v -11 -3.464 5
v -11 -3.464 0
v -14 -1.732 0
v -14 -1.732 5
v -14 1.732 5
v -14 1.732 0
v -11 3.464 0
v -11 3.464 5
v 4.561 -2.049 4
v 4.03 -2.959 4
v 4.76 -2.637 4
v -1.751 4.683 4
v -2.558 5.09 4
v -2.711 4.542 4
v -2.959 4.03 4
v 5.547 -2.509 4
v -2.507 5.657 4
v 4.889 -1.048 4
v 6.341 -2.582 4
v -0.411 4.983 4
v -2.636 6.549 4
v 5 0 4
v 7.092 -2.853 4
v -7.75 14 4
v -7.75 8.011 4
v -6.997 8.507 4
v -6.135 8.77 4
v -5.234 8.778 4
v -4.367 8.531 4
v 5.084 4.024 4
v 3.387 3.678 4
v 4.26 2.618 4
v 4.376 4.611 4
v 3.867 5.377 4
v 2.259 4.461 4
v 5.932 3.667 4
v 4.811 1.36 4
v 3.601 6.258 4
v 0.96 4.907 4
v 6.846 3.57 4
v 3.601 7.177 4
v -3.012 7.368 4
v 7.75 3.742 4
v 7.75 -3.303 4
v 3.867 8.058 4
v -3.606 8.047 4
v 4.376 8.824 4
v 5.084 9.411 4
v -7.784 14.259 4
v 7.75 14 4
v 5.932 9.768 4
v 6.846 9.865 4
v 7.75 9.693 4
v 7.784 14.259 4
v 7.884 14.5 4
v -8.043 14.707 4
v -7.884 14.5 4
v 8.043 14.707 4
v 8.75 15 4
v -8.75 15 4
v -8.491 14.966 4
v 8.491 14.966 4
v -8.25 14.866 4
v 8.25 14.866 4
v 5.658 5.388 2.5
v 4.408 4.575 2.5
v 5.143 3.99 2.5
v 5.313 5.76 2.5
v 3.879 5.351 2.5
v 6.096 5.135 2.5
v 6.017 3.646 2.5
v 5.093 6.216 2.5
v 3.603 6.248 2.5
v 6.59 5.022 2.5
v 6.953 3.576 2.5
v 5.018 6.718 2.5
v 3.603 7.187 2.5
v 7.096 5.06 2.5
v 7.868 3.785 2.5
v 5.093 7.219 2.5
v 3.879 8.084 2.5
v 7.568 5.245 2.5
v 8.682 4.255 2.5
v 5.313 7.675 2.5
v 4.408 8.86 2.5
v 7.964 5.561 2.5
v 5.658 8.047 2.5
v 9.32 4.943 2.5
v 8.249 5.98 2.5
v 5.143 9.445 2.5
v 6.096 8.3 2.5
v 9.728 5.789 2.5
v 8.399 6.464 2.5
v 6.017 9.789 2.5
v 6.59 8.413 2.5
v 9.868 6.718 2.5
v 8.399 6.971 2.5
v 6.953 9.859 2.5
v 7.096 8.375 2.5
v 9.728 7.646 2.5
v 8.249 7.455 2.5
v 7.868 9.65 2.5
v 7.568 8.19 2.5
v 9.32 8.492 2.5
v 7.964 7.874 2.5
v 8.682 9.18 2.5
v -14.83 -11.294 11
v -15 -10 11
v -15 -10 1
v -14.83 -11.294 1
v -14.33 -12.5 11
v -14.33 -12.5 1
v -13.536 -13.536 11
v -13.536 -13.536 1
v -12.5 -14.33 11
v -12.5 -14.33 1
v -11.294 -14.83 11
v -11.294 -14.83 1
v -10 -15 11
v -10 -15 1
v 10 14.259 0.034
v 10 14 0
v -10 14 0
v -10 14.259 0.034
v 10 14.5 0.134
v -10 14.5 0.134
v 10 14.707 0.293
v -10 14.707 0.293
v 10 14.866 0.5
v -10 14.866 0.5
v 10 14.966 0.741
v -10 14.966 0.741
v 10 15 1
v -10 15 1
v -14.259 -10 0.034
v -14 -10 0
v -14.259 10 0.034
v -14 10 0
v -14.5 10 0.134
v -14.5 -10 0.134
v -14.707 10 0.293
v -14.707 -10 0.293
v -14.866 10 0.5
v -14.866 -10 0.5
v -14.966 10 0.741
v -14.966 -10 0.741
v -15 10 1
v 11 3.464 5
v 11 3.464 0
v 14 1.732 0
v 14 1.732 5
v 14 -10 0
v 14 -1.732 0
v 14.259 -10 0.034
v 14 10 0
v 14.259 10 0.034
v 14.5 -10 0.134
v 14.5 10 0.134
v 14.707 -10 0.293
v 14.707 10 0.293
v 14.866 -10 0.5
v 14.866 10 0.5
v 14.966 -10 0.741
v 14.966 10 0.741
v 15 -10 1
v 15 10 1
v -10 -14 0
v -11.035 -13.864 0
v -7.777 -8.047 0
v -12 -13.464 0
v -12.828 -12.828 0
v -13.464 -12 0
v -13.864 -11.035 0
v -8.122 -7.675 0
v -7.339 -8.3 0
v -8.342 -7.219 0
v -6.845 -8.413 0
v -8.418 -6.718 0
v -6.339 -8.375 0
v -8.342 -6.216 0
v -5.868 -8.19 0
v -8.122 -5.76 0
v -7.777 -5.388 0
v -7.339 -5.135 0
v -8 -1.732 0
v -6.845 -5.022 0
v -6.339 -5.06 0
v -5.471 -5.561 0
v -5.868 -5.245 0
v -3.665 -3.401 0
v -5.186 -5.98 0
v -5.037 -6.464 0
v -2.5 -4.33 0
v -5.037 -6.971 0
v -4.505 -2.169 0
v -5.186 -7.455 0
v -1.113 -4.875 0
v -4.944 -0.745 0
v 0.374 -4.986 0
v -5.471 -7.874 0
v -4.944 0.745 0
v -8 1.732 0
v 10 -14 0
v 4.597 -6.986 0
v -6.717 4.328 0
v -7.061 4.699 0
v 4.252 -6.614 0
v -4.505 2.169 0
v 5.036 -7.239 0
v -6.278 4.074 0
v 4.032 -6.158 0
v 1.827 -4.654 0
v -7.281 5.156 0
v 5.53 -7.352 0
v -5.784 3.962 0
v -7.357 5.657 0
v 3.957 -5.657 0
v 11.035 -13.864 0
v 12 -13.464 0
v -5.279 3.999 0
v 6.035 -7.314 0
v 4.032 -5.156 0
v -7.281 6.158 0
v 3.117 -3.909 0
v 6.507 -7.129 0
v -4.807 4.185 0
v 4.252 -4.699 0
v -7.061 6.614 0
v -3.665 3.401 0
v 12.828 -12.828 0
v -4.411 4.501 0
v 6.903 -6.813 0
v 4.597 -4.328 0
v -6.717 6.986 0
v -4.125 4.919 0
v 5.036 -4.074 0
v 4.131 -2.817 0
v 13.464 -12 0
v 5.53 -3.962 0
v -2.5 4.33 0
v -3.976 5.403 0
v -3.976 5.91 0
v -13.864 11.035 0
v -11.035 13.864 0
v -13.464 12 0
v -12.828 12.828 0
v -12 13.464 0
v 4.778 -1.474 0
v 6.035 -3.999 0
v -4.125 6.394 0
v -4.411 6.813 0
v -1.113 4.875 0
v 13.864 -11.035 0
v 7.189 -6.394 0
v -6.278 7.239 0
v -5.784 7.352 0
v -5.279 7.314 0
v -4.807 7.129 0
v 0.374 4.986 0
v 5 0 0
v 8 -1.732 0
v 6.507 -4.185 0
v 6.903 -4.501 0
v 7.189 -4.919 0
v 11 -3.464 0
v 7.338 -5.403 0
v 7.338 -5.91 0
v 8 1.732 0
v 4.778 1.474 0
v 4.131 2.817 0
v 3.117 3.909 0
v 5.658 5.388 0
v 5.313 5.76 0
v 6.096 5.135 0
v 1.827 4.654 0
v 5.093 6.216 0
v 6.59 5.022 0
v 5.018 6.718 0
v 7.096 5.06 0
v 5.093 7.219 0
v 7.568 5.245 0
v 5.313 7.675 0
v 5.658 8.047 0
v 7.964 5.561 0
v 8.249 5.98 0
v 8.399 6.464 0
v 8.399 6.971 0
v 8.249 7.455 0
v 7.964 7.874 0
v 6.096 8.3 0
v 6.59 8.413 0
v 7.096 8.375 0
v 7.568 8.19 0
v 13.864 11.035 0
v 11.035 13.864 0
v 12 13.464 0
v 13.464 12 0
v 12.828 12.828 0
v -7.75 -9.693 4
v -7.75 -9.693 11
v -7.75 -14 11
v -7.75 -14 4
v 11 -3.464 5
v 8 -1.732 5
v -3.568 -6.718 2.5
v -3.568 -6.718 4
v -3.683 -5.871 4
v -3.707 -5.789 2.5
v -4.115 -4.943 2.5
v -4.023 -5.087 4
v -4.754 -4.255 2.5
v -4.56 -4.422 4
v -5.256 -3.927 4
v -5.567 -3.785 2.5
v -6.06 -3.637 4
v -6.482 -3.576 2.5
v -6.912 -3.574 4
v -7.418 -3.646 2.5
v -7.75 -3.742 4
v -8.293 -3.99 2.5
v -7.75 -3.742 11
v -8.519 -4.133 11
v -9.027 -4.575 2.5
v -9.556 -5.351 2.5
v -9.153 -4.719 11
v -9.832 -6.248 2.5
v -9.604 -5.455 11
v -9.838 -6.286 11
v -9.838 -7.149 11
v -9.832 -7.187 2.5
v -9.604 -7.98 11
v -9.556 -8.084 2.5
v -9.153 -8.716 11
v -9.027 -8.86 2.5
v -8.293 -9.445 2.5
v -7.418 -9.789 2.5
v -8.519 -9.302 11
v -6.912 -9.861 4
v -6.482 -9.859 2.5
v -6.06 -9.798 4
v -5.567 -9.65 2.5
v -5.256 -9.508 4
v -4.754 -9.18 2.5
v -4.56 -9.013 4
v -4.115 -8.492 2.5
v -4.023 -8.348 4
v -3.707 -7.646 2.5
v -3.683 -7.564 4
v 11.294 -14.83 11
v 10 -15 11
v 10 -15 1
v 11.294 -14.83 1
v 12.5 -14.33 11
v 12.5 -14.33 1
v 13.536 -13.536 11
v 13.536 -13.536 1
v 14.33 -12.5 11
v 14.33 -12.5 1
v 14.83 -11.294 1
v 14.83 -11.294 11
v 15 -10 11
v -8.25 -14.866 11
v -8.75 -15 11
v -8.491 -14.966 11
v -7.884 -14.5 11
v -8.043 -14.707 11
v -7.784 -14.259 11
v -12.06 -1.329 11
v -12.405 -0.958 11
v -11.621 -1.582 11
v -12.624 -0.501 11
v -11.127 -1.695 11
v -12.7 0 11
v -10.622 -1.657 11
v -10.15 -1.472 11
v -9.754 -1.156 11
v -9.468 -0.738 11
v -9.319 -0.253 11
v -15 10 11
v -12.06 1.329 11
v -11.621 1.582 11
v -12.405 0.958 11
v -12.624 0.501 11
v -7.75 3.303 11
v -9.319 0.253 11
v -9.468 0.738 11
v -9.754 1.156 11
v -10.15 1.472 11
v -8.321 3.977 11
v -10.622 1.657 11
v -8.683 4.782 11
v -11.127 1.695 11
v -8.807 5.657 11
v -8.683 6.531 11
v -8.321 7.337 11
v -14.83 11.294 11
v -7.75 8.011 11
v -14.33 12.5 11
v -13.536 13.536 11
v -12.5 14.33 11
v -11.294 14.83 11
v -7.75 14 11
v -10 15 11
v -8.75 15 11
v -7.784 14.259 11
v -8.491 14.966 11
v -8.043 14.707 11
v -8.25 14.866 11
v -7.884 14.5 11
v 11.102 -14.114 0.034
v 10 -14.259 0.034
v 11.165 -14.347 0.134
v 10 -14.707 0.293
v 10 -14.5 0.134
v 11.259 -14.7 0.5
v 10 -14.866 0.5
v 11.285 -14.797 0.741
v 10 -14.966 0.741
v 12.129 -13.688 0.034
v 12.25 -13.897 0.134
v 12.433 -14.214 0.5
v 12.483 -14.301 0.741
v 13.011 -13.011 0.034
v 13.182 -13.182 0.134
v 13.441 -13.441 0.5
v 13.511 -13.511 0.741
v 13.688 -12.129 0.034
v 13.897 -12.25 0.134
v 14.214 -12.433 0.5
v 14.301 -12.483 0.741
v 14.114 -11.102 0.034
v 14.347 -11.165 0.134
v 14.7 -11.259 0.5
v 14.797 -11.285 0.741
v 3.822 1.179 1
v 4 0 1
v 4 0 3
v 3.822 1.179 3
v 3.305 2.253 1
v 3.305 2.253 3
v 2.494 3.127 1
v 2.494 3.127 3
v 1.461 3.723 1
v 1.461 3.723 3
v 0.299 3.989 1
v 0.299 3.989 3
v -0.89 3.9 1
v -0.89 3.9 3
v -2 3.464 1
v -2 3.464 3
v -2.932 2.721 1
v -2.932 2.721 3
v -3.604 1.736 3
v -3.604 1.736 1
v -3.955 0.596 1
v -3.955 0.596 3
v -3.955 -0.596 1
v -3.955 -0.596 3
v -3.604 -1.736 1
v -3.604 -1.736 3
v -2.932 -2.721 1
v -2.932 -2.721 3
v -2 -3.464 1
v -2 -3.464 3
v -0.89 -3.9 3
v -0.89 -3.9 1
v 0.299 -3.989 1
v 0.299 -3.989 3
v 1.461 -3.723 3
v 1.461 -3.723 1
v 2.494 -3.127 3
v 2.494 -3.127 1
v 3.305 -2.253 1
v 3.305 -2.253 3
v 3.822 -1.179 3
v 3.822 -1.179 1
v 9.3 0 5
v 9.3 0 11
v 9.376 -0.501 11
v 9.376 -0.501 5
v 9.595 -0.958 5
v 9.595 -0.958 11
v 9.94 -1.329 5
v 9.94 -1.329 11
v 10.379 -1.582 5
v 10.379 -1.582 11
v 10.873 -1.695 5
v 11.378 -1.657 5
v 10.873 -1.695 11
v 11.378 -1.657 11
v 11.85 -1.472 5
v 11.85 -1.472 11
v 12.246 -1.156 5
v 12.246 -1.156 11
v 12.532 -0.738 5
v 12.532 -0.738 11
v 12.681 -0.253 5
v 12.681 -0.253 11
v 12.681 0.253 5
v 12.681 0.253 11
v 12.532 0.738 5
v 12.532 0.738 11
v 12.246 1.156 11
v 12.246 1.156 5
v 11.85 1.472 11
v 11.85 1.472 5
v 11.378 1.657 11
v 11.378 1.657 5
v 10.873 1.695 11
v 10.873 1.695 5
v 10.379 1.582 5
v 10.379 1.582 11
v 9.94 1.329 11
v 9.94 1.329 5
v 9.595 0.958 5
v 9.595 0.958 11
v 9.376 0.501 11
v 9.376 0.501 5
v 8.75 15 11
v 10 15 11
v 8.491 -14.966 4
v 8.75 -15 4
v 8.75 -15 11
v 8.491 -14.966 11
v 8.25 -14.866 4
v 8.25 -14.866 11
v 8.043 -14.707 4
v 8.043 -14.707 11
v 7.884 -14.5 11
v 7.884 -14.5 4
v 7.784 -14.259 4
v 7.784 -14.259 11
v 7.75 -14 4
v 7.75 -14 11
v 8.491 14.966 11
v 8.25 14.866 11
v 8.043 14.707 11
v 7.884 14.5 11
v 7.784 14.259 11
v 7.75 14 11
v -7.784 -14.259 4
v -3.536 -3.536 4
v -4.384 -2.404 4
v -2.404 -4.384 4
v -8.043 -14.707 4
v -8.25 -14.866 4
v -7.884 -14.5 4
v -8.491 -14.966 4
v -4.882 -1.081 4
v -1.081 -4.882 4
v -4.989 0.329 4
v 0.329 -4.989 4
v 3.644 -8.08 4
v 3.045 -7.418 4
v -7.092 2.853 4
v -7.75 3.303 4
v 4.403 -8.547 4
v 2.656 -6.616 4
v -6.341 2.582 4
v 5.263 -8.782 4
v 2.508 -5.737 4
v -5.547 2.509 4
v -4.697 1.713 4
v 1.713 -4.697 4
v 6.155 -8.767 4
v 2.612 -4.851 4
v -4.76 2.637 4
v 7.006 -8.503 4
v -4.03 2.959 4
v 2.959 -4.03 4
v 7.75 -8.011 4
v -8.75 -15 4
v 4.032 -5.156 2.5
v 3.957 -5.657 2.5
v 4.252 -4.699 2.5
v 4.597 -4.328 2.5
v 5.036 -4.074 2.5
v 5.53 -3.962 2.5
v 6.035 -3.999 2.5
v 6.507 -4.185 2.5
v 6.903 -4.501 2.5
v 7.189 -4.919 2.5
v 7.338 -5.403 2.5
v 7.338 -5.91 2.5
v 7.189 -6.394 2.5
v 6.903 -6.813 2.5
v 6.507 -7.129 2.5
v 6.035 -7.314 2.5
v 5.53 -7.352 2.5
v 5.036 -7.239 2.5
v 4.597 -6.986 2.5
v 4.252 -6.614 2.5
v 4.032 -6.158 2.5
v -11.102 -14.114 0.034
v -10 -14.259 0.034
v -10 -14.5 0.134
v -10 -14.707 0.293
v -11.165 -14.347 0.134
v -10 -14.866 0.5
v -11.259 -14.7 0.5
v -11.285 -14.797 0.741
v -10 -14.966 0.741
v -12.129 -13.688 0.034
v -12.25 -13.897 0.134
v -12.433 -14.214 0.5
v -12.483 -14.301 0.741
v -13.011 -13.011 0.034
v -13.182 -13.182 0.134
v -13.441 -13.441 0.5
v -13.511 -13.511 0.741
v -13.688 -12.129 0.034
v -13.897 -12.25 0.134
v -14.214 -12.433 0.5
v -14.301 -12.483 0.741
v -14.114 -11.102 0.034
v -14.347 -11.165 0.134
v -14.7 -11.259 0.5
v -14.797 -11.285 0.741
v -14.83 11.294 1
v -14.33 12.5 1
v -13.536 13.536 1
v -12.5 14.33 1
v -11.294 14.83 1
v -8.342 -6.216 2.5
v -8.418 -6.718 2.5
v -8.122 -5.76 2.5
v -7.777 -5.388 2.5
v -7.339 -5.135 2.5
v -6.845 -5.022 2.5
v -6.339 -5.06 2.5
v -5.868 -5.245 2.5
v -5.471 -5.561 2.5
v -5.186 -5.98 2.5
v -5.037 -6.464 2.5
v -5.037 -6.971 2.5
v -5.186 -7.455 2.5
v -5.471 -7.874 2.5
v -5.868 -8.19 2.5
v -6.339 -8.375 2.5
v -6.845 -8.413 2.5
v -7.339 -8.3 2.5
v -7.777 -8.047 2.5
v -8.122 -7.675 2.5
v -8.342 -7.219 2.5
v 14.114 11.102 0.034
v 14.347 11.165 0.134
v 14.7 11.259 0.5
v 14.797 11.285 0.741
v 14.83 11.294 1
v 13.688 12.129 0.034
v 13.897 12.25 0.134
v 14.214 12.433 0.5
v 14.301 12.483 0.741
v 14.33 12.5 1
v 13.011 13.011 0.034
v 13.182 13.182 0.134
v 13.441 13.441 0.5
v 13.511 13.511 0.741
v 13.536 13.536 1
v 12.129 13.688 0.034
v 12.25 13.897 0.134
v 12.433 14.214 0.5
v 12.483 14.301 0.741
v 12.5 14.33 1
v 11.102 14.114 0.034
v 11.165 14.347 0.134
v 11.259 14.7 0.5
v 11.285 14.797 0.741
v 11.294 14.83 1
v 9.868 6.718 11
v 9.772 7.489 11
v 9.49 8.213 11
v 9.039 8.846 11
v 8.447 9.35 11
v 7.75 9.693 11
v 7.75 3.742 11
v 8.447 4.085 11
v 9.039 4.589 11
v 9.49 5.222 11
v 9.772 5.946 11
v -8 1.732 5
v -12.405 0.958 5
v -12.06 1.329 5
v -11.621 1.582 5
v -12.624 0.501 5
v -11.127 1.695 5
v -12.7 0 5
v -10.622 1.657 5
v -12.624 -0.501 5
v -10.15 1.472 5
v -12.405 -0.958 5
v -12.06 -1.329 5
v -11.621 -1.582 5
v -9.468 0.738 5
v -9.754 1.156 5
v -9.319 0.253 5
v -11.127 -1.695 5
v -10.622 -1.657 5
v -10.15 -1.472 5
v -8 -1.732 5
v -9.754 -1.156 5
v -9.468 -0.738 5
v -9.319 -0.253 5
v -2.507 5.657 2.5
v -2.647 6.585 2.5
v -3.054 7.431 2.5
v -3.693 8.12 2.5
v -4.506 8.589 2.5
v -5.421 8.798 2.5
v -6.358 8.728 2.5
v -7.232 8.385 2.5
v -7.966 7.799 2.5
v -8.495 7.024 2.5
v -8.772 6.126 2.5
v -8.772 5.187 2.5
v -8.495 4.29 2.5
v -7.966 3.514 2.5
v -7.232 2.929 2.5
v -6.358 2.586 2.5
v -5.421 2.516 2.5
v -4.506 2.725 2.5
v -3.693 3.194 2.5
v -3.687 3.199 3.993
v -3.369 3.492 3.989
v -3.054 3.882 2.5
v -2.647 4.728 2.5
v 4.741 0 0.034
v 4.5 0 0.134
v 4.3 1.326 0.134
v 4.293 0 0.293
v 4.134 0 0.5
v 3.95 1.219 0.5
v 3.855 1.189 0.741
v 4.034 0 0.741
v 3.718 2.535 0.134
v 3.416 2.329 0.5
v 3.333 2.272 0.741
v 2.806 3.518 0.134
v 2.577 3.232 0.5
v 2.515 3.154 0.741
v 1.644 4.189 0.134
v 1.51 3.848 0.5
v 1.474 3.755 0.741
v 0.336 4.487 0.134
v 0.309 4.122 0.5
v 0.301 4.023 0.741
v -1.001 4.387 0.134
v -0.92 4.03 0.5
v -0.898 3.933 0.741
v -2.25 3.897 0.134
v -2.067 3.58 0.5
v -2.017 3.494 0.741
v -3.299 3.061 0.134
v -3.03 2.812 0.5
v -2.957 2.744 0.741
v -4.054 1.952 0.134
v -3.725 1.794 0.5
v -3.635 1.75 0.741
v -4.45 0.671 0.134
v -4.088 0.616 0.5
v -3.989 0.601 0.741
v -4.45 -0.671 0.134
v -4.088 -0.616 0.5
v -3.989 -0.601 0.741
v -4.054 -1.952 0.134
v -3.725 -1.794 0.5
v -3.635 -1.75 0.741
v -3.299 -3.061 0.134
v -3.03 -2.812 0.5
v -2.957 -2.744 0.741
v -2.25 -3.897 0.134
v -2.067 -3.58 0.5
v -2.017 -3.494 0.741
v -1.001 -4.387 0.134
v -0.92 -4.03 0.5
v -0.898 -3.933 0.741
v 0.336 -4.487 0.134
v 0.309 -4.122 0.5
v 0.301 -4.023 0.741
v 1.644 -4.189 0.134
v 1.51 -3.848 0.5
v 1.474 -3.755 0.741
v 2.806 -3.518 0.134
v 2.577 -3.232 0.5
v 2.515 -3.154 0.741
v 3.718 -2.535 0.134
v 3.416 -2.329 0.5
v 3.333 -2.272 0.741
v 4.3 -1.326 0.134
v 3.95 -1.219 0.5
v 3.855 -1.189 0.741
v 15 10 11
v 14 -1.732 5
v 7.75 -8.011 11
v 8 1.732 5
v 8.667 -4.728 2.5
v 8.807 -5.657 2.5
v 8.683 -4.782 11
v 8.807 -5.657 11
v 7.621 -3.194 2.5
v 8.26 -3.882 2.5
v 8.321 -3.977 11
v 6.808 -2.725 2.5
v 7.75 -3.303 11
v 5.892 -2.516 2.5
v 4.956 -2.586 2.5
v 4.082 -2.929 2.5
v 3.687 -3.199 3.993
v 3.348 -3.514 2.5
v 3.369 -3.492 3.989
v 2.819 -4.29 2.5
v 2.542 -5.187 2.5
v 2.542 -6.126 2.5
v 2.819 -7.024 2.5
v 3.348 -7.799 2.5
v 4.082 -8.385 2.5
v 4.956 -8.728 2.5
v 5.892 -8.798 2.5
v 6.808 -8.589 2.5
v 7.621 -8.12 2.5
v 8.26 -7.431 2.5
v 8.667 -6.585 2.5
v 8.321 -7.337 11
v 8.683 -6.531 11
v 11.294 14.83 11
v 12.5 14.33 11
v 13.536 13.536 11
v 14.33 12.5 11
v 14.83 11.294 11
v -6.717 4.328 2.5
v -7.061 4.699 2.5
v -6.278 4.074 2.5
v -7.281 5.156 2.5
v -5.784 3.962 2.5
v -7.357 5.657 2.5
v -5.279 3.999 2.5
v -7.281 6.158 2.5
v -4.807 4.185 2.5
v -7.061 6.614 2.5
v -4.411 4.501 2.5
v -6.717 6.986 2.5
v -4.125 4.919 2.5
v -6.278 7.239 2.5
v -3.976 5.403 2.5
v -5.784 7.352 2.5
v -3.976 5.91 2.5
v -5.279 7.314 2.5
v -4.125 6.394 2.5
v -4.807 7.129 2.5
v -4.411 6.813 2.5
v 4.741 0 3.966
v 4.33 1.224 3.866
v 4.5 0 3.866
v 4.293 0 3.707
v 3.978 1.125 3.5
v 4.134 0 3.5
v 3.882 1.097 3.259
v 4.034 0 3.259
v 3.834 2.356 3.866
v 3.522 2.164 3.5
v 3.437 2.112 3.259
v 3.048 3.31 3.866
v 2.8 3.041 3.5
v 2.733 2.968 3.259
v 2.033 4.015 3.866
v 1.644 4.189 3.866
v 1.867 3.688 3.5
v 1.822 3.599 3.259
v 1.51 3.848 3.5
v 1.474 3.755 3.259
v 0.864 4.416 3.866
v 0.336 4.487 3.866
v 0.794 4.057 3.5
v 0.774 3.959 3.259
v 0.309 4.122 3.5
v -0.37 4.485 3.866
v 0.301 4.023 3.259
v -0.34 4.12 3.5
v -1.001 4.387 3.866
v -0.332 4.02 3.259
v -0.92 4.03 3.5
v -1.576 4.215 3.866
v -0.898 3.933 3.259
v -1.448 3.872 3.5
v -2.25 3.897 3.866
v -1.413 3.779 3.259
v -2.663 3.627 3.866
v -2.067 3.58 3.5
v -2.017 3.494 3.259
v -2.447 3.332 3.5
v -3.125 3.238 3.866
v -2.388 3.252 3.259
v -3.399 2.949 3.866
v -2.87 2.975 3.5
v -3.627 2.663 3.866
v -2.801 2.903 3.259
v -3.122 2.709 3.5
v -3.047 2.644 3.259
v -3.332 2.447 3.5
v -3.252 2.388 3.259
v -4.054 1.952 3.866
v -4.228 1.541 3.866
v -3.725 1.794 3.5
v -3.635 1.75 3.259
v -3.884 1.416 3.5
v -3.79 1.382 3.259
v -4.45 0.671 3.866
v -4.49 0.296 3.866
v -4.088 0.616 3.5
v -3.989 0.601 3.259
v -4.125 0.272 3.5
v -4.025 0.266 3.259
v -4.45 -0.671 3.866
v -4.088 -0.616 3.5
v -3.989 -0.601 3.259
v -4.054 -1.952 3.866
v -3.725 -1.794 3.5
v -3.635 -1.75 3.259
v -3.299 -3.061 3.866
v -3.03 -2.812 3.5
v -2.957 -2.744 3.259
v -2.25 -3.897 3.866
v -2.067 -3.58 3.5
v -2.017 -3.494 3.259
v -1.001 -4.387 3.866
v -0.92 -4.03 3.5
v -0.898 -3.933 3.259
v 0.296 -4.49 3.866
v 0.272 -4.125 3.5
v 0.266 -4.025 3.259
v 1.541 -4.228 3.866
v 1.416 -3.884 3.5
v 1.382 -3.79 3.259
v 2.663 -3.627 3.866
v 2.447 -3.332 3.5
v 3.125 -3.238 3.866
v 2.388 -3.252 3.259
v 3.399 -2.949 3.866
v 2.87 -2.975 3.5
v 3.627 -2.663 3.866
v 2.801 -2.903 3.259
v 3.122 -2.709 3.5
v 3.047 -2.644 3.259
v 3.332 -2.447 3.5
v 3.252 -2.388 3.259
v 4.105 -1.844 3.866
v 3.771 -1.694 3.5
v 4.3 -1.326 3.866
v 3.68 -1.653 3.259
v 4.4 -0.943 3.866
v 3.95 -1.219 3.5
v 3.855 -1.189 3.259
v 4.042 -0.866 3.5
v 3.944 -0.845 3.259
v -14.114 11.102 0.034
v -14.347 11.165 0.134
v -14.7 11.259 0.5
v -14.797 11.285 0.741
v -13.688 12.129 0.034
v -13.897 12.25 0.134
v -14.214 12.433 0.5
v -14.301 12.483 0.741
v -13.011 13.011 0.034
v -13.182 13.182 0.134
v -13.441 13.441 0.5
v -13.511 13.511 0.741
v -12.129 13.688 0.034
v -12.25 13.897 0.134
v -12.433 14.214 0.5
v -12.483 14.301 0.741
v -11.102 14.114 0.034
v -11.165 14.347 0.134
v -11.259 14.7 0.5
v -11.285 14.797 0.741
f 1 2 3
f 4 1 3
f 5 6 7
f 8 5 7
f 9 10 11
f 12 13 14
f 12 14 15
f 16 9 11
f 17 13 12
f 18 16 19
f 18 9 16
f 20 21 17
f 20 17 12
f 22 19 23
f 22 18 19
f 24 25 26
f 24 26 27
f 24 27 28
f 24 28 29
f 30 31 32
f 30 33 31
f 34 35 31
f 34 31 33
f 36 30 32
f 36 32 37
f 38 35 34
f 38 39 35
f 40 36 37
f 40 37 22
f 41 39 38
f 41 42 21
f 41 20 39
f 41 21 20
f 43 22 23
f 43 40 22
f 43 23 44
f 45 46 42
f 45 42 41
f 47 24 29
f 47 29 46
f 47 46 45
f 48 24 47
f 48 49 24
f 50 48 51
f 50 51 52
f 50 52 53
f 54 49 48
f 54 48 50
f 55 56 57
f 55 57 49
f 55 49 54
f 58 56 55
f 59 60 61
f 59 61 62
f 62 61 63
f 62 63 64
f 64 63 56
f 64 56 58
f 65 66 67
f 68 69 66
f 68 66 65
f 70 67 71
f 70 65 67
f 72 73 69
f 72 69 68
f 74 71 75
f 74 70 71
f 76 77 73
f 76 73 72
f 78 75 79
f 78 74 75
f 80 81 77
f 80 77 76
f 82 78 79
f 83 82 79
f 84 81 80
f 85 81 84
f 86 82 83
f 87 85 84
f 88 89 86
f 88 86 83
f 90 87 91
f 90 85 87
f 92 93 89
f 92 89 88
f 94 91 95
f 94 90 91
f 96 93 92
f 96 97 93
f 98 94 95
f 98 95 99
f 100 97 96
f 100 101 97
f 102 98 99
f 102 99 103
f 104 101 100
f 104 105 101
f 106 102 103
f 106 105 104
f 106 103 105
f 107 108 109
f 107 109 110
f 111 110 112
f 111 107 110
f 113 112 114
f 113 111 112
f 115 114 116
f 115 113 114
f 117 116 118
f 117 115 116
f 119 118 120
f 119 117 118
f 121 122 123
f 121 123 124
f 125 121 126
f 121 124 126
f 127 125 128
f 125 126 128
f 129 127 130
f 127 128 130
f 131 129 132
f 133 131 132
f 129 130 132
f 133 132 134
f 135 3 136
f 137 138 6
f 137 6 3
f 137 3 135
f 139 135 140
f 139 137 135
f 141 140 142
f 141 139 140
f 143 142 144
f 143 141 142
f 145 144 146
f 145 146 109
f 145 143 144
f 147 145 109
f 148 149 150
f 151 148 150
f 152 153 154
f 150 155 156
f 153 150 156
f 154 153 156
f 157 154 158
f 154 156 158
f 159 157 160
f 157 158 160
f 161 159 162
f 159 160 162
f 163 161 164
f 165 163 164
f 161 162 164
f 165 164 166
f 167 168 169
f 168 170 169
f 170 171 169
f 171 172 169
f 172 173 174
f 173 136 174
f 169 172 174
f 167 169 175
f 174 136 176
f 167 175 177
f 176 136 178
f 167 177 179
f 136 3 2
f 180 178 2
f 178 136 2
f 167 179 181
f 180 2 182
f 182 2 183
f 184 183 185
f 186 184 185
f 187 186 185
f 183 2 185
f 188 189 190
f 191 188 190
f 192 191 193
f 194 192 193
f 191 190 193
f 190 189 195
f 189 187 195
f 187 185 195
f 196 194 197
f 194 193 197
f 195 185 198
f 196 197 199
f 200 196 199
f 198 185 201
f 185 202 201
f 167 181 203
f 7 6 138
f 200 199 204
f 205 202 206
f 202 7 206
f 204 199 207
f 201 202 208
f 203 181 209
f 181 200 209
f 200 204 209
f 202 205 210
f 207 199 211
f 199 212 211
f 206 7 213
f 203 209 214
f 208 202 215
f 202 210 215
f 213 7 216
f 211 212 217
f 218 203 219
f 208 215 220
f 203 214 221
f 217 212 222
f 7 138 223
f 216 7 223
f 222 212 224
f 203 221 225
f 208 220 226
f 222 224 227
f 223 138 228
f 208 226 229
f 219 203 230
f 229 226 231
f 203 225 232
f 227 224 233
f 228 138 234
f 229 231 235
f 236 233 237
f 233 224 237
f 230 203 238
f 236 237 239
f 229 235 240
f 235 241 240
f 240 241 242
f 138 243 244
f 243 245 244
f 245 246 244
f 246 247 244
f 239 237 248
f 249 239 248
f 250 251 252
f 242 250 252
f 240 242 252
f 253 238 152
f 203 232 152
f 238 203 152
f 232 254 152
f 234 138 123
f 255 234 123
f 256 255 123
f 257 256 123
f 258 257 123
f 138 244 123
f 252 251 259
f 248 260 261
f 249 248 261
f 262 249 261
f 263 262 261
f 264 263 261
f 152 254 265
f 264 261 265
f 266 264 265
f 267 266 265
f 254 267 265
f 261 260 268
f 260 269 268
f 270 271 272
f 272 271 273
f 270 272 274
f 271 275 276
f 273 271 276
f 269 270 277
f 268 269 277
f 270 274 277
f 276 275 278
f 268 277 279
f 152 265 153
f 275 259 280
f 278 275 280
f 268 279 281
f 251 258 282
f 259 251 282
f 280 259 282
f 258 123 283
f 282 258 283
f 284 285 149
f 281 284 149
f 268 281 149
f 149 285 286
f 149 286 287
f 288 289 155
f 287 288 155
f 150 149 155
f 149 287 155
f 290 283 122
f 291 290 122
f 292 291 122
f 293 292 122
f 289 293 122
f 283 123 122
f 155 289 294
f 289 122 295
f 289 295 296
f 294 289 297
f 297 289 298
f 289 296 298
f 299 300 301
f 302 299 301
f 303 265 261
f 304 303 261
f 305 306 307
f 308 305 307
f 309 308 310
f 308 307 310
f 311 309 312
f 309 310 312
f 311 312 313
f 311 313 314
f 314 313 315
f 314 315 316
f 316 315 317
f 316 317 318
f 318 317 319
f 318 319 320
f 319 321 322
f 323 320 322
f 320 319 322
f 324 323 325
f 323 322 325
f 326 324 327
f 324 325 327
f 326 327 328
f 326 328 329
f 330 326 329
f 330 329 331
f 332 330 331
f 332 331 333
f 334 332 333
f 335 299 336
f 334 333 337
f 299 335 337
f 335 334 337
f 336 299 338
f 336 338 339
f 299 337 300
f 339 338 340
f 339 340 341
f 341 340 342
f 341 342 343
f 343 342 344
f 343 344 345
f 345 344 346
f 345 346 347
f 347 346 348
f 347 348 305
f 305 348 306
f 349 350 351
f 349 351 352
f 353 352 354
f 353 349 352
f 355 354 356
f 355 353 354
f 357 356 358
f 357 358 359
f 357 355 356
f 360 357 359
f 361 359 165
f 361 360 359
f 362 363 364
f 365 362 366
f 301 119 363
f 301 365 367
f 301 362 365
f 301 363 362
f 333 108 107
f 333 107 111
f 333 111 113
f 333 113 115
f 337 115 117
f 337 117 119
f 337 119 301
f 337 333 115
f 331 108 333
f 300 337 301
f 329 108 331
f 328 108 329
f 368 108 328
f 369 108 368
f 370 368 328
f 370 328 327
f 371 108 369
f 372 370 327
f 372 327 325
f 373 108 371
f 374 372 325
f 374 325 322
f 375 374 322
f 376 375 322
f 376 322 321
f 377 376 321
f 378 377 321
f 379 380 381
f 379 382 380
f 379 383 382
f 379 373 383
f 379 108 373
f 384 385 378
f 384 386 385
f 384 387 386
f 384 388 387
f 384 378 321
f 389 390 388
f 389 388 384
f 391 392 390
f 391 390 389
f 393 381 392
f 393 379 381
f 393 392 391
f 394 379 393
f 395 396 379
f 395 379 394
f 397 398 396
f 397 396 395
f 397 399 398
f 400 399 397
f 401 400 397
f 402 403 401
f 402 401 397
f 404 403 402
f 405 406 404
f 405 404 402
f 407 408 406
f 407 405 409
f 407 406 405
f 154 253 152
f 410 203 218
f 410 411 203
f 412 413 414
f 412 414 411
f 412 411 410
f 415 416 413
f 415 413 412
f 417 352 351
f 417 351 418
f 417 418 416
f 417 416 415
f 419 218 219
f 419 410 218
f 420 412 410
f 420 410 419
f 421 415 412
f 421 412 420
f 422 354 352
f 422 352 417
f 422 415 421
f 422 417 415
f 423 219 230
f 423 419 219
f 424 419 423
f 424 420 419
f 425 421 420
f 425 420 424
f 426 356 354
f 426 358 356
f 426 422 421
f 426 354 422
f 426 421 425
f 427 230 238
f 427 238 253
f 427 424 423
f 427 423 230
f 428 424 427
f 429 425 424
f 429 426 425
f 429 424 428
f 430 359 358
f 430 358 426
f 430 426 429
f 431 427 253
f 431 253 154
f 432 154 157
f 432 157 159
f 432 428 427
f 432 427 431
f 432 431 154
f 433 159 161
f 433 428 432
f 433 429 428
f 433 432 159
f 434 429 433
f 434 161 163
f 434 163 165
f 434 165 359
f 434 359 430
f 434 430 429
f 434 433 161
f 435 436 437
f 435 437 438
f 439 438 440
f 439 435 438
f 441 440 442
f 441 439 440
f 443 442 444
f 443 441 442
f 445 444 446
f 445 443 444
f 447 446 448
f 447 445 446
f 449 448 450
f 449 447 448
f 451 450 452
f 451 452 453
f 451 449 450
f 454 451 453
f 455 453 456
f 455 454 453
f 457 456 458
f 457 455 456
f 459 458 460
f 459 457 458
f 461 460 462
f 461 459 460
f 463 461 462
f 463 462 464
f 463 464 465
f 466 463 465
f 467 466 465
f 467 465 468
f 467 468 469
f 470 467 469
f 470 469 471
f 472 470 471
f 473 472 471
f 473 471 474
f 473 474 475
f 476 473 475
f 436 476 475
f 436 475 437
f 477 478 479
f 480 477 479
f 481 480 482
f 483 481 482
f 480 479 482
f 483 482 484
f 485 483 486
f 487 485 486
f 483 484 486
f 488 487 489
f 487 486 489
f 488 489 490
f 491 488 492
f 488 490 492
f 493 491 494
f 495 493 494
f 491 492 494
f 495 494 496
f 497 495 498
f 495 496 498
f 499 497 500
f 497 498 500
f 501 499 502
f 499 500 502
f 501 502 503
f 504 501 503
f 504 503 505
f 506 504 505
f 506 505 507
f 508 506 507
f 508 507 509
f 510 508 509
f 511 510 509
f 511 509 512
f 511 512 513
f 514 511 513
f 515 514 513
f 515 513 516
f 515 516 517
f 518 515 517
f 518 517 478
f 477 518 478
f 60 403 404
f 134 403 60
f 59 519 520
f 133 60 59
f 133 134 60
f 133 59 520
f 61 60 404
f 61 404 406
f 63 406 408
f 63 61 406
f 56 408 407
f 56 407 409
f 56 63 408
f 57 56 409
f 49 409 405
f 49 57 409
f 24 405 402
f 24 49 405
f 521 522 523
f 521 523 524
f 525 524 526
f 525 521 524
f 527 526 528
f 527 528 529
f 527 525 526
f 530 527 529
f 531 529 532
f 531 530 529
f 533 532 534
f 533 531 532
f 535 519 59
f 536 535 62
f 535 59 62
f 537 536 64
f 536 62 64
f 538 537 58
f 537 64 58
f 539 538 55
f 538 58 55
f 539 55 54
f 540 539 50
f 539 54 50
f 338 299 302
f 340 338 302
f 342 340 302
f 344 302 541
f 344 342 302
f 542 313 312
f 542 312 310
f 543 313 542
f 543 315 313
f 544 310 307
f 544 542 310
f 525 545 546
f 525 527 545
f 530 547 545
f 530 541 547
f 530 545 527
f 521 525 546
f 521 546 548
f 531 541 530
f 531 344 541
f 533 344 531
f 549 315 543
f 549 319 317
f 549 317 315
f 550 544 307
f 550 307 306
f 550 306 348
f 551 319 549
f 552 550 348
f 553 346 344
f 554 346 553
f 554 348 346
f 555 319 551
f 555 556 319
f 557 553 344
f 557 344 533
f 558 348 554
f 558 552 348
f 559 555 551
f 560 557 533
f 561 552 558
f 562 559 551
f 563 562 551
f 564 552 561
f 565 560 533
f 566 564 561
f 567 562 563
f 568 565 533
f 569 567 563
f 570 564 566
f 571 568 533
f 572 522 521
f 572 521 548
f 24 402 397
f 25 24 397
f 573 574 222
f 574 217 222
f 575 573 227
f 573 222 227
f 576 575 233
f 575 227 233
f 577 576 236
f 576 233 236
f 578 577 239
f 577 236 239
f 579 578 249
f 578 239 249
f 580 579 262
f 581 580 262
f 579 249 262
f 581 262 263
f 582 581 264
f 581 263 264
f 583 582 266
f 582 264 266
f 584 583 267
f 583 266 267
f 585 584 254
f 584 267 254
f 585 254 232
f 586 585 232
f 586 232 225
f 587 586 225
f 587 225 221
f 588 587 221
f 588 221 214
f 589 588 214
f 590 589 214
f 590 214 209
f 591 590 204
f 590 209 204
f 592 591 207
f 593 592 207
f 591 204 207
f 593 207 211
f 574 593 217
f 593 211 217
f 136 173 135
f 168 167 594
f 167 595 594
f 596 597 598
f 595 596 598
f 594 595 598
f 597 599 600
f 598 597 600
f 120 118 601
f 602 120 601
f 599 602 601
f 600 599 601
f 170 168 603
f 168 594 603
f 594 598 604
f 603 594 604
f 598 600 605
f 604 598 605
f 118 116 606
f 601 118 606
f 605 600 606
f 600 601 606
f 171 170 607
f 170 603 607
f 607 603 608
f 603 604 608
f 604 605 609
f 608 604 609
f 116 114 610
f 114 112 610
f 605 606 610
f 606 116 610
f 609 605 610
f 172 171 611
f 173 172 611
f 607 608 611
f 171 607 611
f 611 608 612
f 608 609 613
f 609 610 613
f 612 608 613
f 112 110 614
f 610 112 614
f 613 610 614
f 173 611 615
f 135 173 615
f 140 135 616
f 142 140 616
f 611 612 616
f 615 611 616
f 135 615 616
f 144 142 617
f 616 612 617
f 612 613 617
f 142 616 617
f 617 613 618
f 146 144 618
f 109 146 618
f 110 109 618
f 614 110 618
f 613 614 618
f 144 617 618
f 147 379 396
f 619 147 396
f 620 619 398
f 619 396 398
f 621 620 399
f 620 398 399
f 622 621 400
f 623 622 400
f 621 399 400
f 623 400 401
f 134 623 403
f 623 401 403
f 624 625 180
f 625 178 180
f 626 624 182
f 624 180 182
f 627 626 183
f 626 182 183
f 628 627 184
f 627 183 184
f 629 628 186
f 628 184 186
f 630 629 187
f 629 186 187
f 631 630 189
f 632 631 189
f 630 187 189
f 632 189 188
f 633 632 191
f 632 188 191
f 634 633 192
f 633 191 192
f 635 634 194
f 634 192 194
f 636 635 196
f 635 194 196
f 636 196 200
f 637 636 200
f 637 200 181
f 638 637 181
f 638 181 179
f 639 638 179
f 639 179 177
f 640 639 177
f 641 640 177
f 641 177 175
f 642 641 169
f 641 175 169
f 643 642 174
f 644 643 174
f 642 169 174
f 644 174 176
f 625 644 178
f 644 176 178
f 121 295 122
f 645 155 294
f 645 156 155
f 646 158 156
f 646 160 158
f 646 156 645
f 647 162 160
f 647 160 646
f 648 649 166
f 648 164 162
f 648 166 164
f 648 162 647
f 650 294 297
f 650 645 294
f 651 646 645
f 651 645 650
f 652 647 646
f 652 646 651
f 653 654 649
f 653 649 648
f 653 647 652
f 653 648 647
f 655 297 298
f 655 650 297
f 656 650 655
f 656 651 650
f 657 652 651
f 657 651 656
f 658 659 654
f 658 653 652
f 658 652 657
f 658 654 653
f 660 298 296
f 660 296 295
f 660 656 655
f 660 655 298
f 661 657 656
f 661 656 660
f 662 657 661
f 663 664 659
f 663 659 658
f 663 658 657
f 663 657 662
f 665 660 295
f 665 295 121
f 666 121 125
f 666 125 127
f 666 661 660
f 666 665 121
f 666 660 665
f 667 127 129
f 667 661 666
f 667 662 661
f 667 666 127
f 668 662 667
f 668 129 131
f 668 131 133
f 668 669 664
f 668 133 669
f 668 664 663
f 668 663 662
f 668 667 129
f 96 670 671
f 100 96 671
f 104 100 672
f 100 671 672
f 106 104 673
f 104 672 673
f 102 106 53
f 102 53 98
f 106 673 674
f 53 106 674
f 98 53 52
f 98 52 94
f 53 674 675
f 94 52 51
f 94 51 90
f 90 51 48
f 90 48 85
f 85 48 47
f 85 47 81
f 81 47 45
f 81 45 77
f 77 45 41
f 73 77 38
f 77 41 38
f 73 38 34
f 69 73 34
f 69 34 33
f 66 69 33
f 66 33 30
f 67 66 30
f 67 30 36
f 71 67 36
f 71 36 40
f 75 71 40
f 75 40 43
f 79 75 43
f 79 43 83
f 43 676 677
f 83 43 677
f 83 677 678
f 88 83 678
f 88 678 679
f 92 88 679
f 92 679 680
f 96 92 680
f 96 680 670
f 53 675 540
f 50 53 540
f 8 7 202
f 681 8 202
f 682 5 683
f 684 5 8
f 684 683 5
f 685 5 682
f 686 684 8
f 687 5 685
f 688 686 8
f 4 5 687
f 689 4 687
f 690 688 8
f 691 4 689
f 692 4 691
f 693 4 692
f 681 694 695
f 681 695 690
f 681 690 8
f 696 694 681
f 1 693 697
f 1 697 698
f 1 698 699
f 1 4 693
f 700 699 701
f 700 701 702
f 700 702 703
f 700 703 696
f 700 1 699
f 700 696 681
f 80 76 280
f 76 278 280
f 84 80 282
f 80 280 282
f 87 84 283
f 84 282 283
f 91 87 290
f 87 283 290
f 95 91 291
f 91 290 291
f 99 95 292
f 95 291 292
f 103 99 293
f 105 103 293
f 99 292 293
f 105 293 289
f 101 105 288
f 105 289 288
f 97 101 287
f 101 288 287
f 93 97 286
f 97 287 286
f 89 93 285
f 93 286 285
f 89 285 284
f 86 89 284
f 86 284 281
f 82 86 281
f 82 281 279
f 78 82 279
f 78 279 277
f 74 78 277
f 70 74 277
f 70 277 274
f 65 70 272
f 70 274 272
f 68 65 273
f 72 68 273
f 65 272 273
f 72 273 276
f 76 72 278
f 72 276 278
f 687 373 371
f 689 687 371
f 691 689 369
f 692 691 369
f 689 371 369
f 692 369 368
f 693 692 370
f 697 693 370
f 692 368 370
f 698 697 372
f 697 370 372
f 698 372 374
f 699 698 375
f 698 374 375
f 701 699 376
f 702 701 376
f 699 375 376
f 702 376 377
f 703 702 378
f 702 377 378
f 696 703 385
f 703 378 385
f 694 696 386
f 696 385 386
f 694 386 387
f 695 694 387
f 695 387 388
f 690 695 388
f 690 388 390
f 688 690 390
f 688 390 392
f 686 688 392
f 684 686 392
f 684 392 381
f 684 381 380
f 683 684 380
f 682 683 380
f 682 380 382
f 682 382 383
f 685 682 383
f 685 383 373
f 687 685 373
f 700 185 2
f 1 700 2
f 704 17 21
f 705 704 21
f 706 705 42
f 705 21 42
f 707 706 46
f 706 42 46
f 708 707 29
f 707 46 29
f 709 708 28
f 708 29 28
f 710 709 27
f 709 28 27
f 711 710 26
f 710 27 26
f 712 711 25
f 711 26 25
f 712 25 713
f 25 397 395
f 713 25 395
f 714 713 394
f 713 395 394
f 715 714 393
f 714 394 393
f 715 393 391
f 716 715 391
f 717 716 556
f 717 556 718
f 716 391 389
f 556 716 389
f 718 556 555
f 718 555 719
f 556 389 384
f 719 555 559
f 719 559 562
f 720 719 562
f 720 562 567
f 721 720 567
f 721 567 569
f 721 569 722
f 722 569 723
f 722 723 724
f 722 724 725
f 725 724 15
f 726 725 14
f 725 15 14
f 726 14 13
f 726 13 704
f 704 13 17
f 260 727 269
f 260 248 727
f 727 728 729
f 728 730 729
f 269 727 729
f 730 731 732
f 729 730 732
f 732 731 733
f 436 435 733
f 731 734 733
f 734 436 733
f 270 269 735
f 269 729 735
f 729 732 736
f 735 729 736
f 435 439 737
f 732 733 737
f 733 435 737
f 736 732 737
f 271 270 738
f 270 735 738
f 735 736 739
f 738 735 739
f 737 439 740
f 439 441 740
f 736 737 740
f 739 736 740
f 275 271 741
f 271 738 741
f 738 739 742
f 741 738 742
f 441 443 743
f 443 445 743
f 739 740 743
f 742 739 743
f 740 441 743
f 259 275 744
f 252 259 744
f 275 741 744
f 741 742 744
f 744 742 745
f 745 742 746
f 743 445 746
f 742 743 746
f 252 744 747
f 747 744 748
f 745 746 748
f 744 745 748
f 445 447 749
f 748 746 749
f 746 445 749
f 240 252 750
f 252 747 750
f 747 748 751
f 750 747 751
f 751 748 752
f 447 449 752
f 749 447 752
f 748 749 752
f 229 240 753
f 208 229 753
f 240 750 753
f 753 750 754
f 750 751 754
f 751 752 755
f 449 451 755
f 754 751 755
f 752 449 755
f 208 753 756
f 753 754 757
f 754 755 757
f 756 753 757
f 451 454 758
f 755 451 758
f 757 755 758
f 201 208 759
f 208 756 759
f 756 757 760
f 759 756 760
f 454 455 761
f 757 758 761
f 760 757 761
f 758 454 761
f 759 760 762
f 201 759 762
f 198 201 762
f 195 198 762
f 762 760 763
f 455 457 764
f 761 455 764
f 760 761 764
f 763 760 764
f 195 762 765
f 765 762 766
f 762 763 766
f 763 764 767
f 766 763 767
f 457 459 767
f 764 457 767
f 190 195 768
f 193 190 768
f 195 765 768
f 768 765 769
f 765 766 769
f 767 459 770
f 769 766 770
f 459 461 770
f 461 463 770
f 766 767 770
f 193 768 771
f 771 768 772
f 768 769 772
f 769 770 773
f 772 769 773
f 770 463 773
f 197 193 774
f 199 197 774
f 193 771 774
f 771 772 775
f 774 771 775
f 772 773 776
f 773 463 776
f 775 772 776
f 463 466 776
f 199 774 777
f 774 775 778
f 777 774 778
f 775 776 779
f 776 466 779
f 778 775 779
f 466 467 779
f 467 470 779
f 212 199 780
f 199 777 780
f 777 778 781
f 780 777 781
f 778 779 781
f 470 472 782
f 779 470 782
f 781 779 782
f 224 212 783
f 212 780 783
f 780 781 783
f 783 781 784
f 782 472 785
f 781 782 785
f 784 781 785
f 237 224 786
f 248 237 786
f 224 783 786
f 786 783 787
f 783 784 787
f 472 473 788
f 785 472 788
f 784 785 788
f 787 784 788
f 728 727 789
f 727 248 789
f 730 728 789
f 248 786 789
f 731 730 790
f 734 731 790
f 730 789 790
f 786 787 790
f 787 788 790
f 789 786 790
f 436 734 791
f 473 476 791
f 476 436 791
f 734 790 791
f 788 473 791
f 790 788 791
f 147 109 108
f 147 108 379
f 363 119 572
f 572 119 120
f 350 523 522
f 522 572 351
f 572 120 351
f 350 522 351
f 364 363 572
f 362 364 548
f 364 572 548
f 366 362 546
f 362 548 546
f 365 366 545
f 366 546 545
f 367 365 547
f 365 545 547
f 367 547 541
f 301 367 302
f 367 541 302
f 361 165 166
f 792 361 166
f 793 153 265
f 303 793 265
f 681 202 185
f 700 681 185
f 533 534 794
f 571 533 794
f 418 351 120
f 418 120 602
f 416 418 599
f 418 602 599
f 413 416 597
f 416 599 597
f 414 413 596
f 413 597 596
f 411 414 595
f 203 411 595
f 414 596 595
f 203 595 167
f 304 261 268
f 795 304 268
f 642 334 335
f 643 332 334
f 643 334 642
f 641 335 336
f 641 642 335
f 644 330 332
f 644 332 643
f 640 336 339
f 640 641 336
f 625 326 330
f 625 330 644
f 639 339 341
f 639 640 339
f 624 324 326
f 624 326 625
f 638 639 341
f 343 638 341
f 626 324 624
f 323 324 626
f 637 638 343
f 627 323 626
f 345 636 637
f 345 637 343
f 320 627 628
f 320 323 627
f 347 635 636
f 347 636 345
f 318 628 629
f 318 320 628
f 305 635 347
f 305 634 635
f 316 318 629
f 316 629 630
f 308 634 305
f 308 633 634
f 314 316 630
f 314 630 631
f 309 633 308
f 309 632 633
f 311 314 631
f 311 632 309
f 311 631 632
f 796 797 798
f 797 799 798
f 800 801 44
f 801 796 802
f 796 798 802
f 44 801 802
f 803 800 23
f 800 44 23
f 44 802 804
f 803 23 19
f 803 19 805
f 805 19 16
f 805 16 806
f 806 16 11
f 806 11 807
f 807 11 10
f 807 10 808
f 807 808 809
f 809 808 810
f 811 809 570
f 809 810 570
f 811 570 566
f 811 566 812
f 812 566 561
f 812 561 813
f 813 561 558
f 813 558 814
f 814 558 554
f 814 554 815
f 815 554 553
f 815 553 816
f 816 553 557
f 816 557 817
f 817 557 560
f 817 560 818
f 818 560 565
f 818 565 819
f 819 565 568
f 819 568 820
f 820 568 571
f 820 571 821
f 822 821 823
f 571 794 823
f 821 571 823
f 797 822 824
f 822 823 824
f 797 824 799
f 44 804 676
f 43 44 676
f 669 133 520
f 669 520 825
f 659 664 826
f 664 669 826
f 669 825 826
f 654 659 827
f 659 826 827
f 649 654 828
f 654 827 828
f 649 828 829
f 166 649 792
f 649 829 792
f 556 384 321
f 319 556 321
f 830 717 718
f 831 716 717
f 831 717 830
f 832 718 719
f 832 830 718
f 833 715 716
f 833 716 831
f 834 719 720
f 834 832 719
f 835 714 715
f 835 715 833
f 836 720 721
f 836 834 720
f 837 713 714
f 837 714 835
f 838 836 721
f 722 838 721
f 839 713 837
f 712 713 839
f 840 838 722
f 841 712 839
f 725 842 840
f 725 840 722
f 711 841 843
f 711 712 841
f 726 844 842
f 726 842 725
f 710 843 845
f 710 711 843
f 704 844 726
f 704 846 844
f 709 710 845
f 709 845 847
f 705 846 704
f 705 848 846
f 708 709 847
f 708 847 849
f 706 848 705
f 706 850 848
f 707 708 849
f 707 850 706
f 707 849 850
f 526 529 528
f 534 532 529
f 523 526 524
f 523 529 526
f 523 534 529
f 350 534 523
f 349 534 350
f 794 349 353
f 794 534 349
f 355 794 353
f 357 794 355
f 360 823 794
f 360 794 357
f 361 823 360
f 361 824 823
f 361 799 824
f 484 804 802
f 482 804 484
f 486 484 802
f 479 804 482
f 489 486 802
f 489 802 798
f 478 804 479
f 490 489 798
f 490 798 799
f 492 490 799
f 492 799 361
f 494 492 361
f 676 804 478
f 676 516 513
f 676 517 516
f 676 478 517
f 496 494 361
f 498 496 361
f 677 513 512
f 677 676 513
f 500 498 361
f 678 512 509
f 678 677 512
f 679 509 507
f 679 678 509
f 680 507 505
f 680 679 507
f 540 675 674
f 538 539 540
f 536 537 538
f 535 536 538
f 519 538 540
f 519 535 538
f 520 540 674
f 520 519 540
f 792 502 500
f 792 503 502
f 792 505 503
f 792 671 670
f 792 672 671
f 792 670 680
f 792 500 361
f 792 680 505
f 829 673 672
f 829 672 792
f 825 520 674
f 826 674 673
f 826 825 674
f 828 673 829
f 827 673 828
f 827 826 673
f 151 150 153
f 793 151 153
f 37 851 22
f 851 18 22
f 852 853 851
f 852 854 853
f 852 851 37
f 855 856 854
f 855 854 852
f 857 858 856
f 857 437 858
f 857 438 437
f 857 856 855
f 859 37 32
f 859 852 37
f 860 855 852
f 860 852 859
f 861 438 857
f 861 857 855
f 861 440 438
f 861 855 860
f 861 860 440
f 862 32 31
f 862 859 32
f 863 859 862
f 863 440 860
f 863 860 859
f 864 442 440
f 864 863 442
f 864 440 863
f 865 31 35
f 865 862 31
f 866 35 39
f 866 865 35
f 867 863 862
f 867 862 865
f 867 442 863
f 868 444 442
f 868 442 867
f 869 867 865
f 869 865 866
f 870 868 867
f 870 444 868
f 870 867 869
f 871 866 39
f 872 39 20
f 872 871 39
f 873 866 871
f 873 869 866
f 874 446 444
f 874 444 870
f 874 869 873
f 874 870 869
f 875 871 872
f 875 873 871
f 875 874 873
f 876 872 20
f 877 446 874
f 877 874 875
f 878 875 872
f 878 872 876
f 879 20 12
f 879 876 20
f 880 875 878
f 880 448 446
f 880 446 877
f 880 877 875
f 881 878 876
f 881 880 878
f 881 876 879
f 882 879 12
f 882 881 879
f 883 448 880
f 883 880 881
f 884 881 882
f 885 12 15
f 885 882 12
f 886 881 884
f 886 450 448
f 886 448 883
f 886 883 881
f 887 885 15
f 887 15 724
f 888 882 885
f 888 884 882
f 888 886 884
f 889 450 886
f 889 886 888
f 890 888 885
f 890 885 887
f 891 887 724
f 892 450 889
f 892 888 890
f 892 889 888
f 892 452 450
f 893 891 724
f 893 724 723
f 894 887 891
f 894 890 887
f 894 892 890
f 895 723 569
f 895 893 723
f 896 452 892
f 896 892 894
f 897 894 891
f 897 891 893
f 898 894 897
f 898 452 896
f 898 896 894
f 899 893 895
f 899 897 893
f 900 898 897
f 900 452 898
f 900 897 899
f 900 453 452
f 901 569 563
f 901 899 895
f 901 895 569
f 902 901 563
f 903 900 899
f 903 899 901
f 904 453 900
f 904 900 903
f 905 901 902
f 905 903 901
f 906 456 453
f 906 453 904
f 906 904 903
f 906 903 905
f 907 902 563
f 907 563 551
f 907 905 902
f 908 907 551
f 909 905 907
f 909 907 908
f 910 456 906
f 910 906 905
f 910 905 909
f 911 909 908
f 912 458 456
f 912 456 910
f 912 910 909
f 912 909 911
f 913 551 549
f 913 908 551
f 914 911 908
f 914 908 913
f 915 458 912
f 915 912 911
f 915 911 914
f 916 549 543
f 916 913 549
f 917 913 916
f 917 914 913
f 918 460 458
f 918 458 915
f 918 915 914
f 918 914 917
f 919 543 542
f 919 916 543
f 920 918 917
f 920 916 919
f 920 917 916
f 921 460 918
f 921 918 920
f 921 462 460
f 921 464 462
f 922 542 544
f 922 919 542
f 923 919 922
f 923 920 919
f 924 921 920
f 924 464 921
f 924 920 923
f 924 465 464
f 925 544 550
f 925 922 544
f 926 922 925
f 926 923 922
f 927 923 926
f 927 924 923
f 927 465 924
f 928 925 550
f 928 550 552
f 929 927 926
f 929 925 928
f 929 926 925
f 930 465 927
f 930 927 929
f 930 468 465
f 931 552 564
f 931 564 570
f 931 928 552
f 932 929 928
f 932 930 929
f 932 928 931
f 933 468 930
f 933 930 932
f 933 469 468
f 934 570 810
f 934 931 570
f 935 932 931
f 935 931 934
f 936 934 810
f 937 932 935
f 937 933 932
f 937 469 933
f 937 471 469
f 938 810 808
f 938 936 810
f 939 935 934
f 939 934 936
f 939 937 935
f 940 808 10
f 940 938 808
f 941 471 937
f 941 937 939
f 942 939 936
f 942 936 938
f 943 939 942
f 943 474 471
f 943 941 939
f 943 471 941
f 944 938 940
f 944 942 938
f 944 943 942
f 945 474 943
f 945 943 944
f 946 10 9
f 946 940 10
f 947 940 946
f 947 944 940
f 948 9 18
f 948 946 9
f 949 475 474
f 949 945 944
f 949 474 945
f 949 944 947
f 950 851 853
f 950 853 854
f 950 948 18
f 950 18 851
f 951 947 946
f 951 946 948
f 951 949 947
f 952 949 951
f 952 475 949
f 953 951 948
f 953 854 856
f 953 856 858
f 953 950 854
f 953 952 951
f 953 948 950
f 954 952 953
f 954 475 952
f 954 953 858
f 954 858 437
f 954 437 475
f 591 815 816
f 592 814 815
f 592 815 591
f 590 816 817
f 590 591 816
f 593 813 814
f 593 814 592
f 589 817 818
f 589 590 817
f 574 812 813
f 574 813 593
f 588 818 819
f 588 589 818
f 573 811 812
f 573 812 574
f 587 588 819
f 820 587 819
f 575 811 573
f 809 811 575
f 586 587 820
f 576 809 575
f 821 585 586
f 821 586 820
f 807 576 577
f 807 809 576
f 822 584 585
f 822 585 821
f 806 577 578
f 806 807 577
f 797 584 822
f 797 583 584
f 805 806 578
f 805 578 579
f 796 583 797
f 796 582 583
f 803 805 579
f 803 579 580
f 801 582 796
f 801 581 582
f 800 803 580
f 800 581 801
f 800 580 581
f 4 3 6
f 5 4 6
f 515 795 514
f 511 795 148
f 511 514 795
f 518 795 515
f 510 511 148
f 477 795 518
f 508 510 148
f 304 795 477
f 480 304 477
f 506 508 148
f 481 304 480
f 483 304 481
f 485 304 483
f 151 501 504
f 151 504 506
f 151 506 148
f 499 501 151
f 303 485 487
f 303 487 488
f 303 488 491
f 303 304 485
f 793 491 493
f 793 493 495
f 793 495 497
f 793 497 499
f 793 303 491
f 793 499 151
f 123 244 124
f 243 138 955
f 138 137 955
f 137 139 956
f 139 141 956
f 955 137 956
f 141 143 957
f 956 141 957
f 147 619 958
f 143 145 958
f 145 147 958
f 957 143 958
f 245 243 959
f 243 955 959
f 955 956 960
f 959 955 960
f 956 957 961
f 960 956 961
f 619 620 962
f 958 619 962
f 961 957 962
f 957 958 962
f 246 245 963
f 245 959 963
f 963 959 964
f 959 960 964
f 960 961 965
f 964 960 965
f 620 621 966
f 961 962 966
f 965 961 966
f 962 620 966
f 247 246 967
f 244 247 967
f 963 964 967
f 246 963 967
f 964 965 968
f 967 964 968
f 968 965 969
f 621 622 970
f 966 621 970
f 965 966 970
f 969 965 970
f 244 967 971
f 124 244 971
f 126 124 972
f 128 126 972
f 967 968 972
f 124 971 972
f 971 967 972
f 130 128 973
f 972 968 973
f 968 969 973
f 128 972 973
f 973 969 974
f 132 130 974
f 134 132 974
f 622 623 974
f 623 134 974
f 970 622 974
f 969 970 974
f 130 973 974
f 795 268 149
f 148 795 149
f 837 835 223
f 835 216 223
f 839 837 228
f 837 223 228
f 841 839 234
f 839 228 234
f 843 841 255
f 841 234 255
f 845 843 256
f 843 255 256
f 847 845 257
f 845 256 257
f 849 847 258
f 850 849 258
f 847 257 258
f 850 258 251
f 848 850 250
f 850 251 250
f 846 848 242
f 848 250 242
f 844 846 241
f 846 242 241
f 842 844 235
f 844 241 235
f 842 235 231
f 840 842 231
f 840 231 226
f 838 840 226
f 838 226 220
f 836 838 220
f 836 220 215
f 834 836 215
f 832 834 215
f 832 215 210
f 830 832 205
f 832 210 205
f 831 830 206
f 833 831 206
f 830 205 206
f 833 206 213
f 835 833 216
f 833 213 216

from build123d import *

# Parameters (mm, degrees)
F0_W           = 30
F0_H           = 30
F0_R           = 4
F1_DEPTH       = 11
F3_D           = 3.4
F3_CBORE_D     = 6.3
F3_CBORE_DEPTH = 8.5
F5_D           = 3.4
F6_DEPTH       = 5
F7_R           = 4
F8_DEPTH       = 7
F9_R           = 5
F10_T1_DEPTH   = 9.5
F10_T3_DEPTH   = 20
F10_T5_DEPTH   = 20
F10_T12_ANGLE  = 90
F10_T14_ANGLE  = 90
F10_T16_ANGLE  = 90
F10_T18_ANGLE  = 90


# Not quite as in the source:
# - a fillet or chamfer that OpenCascade refuses, or shapes differently, is made with other operations: its cross-section is extruded or revolved along the edge and cut away or added


with BuildPart() as f1:
    # F0 (on Top) → F1 (new body)
    with BuildSketch(Plane.XY):
        Rectangle(F0_W, F0_H)
        Circle(F0_R, mode=Mode.SUBTRACT)
    extrude(amount=F1_DEPTH)

    # F3 (through all)
    with Locations(Plane.XY.offset(11)):
        with Locations((-6.7175144213, -6.7175144213), (-5.6568542495, 5.6568542495), (6.7175144213, 6.7175144213), (5.6568542495, -5.6568542495)):
            CounterBoreHole(F3_D / 2, F3_CBORE_D / 2, F3_CBORE_DEPTH)

    # F5 (through all)
    with Locations(Plane(origin=(0, 0, 0), x_dir=(1, 0, 0), z_dir=(0, 0, -1))):
        with Locations((-11, 0), (11, 0)):
            Hole(F5_D / 2)

    # F4 (on face) → F6 (cut)
    with BuildSketch(Plane(origin=(0, 0, 0), x_dir=(1, 0, 0), z_dir=(0, 0, -1))):
        Polygon((14, -1.7320508076), (14, 1.7320508076), (11, 3.4641016151), (8, 1.7320508076), (8, -1.7320508076), (11, -3.4641016151), align=None)
        Polygon((-8, -1.7320508076), (-8, 1.7320508076), (-11, 3.4641016151), (-14, 1.7320508076), (-14, -1.7320508076), (-11, -3.4641016151), align=None)
    extrude(amount=-F6_DEPTH, mode=Mode.SUBTRACT)

    # F7 (on face) → F8 (cut)
    with BuildSketch(Plane.XY.offset(11)):
        with BuildLine():
            Line((-7.75, -15), (7.75, -15))
            Line((7.75, -15), (7.75, -8.0108382909))
            ThreePointArc((7.75, -8.0108382909), (2.5068542495, -5.6568542495), (7.75, -3.3028702081))
            Line((7.75, -3.3028702081), (7.75, 3.7415316374))
            ThreePointArc((7.75, 3.7415316374), (3.5675144213, 6.7175144213), (7.75, 9.6934972051))
            Line((7.75, 9.6934972051), (7.75, 15))
            Line((7.75, 15), (-7.75, 15))
            Line((-7.75, 15), (-7.75, 8.0108382909))
            ThreePointArc((-7.75, 8.0108382909), (-4.3666816087, 8.5305199498), (-2.5068542495, 5.6568542495))
            ThreePointArc((-2.5068542495, 5.6568542495), (-4.3666816087, 2.7831885492), (-7.75, 3.3028702081))
            Line((-7.75, 3.3028702081), (-7.75, -3.7415316374))
            ThreePointArc((-7.75, -3.7415316374), (-4.8912928538, -4.1509184682), (-3.5675144213, -6.7175144213))
            ThreePointArc((-3.5675144213, -6.7175144213), (-4.8912928538, -9.2841103744), (-7.75, -9.6934972051))
            Line((-7.75, -9.6934972051), (-7.75, -15))
        make_face()
        Circle(F7_R, mode=Mode.SUBTRACT)
    extrude(amount=-F8_DEPTH, mode=Mode.SUBTRACT)

    # F9
    f9_edges = [f1.edges().sort_by_distance(p)[0] for p in [
        (15, 15, 5.5),
        (-15, 15, 5.5),
        (15, -15, 5.5),
        (-15, -15, 5.5),
    ]]
    fillet(f9_edges, radius=F9_R)

    # F10: fillet of radius 1 on 15 edges, made by hand

    # F10_s2 → F10_t1 (cut)
    with BuildSketch(Plane.XY.offset(4)):
        with BuildLine():
            ThreePointArc((8.75, 15), (8.0428932188, 14.7071067812), (7.75, 14))
            Line((7.75, 14), (7.75, 15))
            Line((7.75, 15), (8.75, 15))
        make_face()
        with BuildLine():
            ThreePointArc((-8.75, 15), (-8.0428932188, 14.7071067812), (-7.75, 14))
            Line((-7.75, 14), (-7.75, 15))
            Line((-7.75, 15), (-8.75, 15))
        make_face()
        with BuildLine():
            ThreePointArc((8.75, -15), (8.0428932188, -14.7071067812), (7.75, -14))
            Line((7.75, -14), (7.75, -15))
            Line((7.75, -15), (8.75, -15))
        make_face()
        with BuildLine():
            ThreePointArc((-8.75, -15), (-8.0428932188, -14.7071067812), (-7.75, -14))
            Line((-7.75, -14), (-7.75, -15))
            Line((-7.75, -15), (-8.75, -15))
        make_face()
    extrude(amount=F10_T1_DEPTH, mode=Mode.SUBTRACT)

    # F10_s4 → F10_t3 (cut)
    with BuildSketch(Plane.YZ.offset(-10)):
        with BuildLine():
            ThreePointArc((-15, 1), (-14.7071067812, 0.2928932188), (-14, 0))
            Line((-14, 0), (-15, 0))
            Line((-15, 0), (-15, 1))
        make_face()
        with BuildLine():
            ThreePointArc((14, 0), (14.7071067812, 0.2928932188), (15, 1))
            Line((15, 1), (15, 0))
            Line((15, 0), (14, 0))
        make_face()
    extrude(amount=F10_T3_DEPTH, mode=Mode.SUBTRACT)

    # F10_s6 → F10_t5 (cut)
    with BuildSketch(Plane.XZ.offset(-10)):
        with BuildLine():
            ThreePointArc((-14, 0), (-14.7071067812, 0.2928932188), (-15, 1))
            Line((-15, 1), (-15, 0))
            Line((-15, 0), (-14, 0))
        make_face()
        with BuildLine():
            ThreePointArc((14, 0), (14.7071067812, 0.2928932188), (15, 1))
            Line((15, 1), (15, 0))
            Line((15, 0), (14, 0))
        make_face()
    extrude(amount=F10_T5_DEPTH, mode=Mode.SUBTRACT)

    # F10_s7 → F10_t8 (revolve, cut)
    with BuildSketch(Plane.XZ):
        with BuildLine():
            ThreePointArc((5, 4), (4.2928932188, 3.7071067812), (4, 3))
            Line((4, 3), (4, 4))
            Line((4, 4), (5, 4))
        make_face()
    revolve(axis=Axis((0, 0, 4), (0, 0, 1)), mode=Mode.SUBTRACT)

    # F10_s9 → F10_t10 (revolve, cut)
    with BuildSketch(Plane.XZ):
        with BuildLine():
            ThreePointArc((5, 0), (4.2928932188, 0.2928932188), (4, 1))
            Line((4, 1), (4, 0))
            Line((4, 0), (5, 0))
        make_face()
    revolve(axis=Axis((0, 0, 0), (0, 0, 1)), mode=Mode.SUBTRACT)

    # F10_s11 → F10_t12 (revolve, cut)
    with BuildSketch(Plane.YZ.offset(-10)):
        with BuildLine():
            ThreePointArc((-14, 0), (-14.7071067812, 0.2928932188), (-15, 1))
            Line((-15, 1), (-15, 0))
            Line((-15, 0), (-14, 0))
        make_face()
    revolve(axis=Axis((-10, -10, 0), (0, 0, -1)), revolution_arc=F10_T12_ANGLE, mode=Mode.SUBTRACT)

    # F10_s13 → F10_t14 (revolve, cut)
    with BuildSketch(Plane.YZ.offset(10)):
        with BuildLine():
            ThreePointArc((-14, 0), (-14.7071067812, 0.2928932188), (-15, 1))
            Line((-15, 1), (-15, 0))
            Line((-15, 0), (-14, 0))
        make_face()
    revolve(axis=Axis((10, -10, 0), (0, 0, 1)), revolution_arc=F10_T14_ANGLE, mode=Mode.SUBTRACT)

    # F10_s15 → F10_t16 (revolve, cut)
    with BuildSketch(Plane.XZ.offset(-10)):
        with BuildLine():
            ThreePointArc((-14, 0), (-14.7071067812, 0.2928932188), (-15, 1))
            Line((-15, 1), (-15, 0))
            Line((-15, 0), (-14, 0))
        make_face()
    revolve(axis=Axis((-10, 10, 0), (0, 0, -1)), revolution_arc=F10_T16_ANGLE, mode=Mode.SUBTRACT)

    # F10_s17 → F10_t18 (revolve, cut)
    with BuildSketch(Plane.XZ.offset(-10)):
        with BuildLine():
            ThreePointArc((14, 0), (14.7071067812, 0.2928932188), (15, 1))
            Line((15, 1), (15, 0))
            Line((15, 0), (14, 0))
        make_face()
    revolve(axis=Axis((10, 10, 0), (0, 0, 1)), revolution_arc=F10_T18_ANGLE, mode=Mode.SUBTRACT)


solid = f1.part
